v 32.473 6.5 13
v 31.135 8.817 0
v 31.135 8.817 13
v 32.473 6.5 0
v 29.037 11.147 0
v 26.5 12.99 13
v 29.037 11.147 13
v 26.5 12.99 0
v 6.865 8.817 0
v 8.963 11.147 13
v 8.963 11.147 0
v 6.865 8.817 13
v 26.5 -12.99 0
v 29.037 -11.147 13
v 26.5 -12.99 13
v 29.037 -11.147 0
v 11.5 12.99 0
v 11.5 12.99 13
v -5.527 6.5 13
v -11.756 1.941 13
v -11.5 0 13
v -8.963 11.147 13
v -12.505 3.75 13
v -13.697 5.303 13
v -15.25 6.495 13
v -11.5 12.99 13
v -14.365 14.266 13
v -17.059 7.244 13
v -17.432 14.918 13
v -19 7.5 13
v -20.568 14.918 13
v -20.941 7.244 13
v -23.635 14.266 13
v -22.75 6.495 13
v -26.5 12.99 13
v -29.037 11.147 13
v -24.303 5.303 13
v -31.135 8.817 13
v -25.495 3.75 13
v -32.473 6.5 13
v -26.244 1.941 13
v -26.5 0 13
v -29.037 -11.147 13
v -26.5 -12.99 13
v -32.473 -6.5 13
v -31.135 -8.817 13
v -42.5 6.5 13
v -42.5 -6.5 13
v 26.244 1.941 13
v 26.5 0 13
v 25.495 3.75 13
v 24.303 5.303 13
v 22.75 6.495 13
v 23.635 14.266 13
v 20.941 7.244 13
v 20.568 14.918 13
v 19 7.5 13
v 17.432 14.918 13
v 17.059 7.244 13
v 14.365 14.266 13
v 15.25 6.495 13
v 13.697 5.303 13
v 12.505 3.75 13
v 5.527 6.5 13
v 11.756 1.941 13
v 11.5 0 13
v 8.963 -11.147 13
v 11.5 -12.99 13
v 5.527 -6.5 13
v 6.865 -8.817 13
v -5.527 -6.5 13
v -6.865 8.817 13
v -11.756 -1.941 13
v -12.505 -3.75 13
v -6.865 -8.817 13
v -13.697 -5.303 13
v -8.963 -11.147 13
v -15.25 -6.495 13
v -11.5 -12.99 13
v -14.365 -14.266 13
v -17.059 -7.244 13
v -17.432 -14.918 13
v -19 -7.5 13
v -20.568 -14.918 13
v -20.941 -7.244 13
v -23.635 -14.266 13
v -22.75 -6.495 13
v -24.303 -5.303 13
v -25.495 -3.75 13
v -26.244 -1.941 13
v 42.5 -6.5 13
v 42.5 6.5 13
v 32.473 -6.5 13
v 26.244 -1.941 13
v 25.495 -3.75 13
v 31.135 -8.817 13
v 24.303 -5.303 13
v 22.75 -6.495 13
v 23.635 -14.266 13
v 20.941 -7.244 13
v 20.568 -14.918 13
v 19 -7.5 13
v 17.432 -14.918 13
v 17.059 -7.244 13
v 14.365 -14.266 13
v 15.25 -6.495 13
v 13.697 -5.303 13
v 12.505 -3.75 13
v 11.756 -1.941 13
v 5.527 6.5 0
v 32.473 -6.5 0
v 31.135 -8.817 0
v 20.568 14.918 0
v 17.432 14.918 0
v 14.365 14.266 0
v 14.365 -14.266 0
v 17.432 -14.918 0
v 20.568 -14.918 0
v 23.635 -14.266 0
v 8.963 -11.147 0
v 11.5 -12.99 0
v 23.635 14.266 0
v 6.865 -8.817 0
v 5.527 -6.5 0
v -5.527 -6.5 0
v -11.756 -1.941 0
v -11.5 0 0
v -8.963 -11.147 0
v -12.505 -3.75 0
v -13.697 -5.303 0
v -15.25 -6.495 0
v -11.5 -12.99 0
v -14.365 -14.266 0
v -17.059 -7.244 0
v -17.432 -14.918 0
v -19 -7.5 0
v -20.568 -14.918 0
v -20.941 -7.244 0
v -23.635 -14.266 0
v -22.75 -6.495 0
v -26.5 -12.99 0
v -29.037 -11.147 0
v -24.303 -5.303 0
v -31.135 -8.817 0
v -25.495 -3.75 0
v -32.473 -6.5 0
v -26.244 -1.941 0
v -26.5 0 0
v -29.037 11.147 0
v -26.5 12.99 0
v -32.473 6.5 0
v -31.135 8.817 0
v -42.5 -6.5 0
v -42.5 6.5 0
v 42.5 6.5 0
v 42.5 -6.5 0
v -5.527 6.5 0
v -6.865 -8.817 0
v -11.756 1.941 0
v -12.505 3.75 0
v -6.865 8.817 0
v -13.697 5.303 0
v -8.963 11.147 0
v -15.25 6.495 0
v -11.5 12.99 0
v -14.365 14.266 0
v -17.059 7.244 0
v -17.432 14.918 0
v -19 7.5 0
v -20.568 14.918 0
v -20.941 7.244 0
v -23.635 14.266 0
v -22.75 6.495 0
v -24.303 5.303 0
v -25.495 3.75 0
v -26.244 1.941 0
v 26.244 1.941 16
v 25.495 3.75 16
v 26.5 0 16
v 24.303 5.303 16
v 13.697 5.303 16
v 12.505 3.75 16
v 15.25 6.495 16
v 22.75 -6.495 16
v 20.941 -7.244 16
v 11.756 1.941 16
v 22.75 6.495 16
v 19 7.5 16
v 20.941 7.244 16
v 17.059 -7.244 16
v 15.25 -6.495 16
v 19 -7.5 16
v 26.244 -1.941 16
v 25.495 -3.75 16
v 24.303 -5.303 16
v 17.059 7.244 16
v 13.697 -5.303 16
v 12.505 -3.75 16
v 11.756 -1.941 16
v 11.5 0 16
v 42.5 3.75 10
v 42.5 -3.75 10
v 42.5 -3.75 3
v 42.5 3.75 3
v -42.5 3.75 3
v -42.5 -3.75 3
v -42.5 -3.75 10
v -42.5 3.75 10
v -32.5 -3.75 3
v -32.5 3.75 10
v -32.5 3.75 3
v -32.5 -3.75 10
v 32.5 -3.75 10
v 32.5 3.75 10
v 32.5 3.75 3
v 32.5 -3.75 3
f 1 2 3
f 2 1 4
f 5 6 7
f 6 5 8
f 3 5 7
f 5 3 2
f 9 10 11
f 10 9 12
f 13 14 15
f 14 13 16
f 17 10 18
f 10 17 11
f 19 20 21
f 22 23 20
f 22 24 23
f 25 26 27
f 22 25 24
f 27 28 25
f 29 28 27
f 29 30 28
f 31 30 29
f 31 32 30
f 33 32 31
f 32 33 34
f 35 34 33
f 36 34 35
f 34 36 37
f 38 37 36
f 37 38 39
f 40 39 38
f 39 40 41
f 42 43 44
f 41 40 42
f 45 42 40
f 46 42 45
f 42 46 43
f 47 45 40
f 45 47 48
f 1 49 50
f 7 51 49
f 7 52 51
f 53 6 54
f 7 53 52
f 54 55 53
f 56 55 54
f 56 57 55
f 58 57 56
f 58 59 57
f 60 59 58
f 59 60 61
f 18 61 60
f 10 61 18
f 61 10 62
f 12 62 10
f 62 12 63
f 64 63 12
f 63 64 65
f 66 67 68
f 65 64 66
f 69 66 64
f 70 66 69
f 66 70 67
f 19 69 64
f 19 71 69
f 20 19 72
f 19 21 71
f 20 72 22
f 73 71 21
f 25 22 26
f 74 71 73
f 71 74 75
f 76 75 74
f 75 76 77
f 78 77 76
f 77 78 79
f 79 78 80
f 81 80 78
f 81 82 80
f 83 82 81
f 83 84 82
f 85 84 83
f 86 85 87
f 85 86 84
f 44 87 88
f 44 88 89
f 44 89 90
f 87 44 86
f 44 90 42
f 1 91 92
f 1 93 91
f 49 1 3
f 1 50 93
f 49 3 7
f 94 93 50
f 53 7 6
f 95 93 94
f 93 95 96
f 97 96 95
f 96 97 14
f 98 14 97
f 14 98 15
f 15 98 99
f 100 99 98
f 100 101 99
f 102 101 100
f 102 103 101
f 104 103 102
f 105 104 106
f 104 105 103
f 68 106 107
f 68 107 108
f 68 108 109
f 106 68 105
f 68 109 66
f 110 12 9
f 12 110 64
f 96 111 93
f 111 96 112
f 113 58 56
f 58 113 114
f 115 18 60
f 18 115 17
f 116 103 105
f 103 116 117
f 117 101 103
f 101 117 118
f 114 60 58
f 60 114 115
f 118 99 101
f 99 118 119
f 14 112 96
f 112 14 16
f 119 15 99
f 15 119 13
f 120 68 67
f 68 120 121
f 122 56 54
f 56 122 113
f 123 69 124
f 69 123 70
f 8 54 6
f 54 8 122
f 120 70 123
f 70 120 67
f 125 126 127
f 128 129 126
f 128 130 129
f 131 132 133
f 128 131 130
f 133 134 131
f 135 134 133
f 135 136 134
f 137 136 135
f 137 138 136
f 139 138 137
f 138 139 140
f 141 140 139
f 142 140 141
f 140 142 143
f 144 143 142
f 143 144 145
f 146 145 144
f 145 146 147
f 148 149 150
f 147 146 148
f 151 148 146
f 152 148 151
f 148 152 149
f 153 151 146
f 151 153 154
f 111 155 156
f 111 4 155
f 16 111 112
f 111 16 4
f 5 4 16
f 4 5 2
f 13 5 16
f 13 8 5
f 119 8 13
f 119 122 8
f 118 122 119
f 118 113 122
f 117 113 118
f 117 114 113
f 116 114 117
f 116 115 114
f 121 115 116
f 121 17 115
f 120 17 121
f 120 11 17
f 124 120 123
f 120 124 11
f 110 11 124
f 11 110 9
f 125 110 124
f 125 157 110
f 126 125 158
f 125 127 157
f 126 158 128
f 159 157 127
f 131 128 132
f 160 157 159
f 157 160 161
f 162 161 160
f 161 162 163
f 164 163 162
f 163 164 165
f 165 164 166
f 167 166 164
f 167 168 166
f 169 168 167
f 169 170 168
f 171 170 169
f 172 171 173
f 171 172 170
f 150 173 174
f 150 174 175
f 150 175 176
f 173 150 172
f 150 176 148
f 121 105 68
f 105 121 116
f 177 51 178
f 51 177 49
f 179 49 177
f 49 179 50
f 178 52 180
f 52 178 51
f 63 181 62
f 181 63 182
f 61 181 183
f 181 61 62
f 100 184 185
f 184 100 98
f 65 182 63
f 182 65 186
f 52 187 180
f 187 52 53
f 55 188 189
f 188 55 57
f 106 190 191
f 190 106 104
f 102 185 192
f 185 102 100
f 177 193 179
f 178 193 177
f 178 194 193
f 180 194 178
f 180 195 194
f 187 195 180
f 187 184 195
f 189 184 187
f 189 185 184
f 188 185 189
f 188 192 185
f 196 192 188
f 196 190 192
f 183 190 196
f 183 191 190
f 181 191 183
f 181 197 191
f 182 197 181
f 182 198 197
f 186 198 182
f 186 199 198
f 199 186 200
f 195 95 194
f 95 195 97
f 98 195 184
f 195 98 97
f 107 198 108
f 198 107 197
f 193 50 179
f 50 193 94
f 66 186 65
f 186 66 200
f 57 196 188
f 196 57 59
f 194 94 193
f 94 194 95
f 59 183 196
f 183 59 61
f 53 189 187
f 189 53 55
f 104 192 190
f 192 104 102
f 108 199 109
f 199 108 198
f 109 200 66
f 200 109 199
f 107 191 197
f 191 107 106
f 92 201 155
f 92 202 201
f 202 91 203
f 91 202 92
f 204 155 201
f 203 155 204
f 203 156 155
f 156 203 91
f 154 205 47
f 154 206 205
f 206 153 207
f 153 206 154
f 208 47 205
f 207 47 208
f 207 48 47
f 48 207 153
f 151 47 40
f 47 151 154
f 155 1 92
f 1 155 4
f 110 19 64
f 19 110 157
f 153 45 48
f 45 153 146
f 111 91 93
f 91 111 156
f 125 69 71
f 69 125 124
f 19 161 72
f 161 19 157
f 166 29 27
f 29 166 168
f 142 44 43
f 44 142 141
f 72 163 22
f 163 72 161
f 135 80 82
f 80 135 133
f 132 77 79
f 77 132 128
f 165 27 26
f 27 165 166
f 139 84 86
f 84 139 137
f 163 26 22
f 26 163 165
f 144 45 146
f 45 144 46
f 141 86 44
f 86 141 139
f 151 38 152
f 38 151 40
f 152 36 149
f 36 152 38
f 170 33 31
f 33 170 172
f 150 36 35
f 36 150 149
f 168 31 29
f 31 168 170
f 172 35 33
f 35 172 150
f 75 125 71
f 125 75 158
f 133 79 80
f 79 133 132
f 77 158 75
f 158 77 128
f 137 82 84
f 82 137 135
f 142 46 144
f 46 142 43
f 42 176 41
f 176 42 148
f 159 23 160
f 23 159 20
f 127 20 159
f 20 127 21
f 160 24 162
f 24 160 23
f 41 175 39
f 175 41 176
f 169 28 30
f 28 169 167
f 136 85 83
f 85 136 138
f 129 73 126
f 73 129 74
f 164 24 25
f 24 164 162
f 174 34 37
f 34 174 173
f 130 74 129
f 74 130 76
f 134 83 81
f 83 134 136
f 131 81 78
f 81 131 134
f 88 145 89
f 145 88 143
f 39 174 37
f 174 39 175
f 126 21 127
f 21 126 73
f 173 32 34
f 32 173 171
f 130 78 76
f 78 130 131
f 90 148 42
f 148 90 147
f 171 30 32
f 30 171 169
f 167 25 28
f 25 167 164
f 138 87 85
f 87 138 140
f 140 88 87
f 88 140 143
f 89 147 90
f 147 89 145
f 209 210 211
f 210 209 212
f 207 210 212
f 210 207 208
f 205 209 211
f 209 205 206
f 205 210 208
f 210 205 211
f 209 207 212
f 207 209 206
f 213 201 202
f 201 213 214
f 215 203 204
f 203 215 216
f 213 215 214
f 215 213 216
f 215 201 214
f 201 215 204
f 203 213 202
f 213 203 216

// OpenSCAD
holder_length = 85;
holder_width = 13;
holder_height = 13;

gear_distance = 38;
gear_tab_diameter = 15;

brace_width = 7.5;
brace_height = 7;

crank_size = 8;
crank_length = 20;

translate([0, 0, holder_height/2]) bottom();
//translate([0, 0, holder_height/2]) top();
//translate([0, 0, crank_size/2]) crank();
//gear();

module gear() {
	difference() {
		union() {
			import_stl("gears.stl", convexity = 20);
			translate([0, 0, 3.75]) cube([30, 30, 7.5], center = true);
		}
		translate([0, 0, -1]) cylinder(5+1, gear_tab_diameter/2, gear_tab_diameter/2);
		translate([0, 0, 10]) cube([crank_size, crank_size, 20], center = true);
	}
}

module crank() {
	union() {
		cube([crank_length, crank_size, crank_size], center = true);
		translate([crank_length/2+crank_size/2, -crank_length*2/2+crank_size/2, 0]) {
			cube([crank_size, crank_length*2, crank_size], center = true);
			rotate([0, 90, 0]) {
				translate([0, -crank_length+crank_size/2, crank_length/2/2/2+crank_size/2]) {
					cylinder(crank_length, crank_size/2, crank_size/2, center = true, $fn=20);
				}
			}
		}
	}
}

module top() {
	difference() {
		bottom();
		translate([+gear_distance/2, 0, 0])
			cylinder(holder_height*2, gear_tab_diameter/2, gear_tab_diameter/2, center = true);
		translate([+gear_distance/2, 0, 5])
			cylinder(holder_height, gear_tab_diameter+0.5, gear_tab_diameter+0.5, center = true);
	}
}

module bottom() {
	difference() {
		union() {
			cube([holder_length, holder_width, holder_height], center= true);

			translate([-gear_distance/2, 0, 0])
				cylinder(holder_height, gear_tab_diameter, gear_tab_diameter, center = true);

			translate([+gear_distance/2, 0, 0]) {
				cylinder(holder_height, gear_tab_diameter, gear_tab_diameter, center = true);
				translate([0, 0, +3]) {
					cylinder(holder_height, gear_tab_diameter/2, gear_tab_diameter/2, center = true);
				}
			}
		}

		translate([-gear_distance/2, 0, 0])
			cylinder(holder_height+2, gear_tab_diameter/2, gear_tab_diameter/2, center = true);

		translate([-holder_length/2-5.5+10, 0, 0])
			cube([11, brace_width, brace_height], center = true);

		translate([+holder_length/2+5.5-10, 0, 0])
			cube([11, brace_width, brace_height], center = true);
	}
}
